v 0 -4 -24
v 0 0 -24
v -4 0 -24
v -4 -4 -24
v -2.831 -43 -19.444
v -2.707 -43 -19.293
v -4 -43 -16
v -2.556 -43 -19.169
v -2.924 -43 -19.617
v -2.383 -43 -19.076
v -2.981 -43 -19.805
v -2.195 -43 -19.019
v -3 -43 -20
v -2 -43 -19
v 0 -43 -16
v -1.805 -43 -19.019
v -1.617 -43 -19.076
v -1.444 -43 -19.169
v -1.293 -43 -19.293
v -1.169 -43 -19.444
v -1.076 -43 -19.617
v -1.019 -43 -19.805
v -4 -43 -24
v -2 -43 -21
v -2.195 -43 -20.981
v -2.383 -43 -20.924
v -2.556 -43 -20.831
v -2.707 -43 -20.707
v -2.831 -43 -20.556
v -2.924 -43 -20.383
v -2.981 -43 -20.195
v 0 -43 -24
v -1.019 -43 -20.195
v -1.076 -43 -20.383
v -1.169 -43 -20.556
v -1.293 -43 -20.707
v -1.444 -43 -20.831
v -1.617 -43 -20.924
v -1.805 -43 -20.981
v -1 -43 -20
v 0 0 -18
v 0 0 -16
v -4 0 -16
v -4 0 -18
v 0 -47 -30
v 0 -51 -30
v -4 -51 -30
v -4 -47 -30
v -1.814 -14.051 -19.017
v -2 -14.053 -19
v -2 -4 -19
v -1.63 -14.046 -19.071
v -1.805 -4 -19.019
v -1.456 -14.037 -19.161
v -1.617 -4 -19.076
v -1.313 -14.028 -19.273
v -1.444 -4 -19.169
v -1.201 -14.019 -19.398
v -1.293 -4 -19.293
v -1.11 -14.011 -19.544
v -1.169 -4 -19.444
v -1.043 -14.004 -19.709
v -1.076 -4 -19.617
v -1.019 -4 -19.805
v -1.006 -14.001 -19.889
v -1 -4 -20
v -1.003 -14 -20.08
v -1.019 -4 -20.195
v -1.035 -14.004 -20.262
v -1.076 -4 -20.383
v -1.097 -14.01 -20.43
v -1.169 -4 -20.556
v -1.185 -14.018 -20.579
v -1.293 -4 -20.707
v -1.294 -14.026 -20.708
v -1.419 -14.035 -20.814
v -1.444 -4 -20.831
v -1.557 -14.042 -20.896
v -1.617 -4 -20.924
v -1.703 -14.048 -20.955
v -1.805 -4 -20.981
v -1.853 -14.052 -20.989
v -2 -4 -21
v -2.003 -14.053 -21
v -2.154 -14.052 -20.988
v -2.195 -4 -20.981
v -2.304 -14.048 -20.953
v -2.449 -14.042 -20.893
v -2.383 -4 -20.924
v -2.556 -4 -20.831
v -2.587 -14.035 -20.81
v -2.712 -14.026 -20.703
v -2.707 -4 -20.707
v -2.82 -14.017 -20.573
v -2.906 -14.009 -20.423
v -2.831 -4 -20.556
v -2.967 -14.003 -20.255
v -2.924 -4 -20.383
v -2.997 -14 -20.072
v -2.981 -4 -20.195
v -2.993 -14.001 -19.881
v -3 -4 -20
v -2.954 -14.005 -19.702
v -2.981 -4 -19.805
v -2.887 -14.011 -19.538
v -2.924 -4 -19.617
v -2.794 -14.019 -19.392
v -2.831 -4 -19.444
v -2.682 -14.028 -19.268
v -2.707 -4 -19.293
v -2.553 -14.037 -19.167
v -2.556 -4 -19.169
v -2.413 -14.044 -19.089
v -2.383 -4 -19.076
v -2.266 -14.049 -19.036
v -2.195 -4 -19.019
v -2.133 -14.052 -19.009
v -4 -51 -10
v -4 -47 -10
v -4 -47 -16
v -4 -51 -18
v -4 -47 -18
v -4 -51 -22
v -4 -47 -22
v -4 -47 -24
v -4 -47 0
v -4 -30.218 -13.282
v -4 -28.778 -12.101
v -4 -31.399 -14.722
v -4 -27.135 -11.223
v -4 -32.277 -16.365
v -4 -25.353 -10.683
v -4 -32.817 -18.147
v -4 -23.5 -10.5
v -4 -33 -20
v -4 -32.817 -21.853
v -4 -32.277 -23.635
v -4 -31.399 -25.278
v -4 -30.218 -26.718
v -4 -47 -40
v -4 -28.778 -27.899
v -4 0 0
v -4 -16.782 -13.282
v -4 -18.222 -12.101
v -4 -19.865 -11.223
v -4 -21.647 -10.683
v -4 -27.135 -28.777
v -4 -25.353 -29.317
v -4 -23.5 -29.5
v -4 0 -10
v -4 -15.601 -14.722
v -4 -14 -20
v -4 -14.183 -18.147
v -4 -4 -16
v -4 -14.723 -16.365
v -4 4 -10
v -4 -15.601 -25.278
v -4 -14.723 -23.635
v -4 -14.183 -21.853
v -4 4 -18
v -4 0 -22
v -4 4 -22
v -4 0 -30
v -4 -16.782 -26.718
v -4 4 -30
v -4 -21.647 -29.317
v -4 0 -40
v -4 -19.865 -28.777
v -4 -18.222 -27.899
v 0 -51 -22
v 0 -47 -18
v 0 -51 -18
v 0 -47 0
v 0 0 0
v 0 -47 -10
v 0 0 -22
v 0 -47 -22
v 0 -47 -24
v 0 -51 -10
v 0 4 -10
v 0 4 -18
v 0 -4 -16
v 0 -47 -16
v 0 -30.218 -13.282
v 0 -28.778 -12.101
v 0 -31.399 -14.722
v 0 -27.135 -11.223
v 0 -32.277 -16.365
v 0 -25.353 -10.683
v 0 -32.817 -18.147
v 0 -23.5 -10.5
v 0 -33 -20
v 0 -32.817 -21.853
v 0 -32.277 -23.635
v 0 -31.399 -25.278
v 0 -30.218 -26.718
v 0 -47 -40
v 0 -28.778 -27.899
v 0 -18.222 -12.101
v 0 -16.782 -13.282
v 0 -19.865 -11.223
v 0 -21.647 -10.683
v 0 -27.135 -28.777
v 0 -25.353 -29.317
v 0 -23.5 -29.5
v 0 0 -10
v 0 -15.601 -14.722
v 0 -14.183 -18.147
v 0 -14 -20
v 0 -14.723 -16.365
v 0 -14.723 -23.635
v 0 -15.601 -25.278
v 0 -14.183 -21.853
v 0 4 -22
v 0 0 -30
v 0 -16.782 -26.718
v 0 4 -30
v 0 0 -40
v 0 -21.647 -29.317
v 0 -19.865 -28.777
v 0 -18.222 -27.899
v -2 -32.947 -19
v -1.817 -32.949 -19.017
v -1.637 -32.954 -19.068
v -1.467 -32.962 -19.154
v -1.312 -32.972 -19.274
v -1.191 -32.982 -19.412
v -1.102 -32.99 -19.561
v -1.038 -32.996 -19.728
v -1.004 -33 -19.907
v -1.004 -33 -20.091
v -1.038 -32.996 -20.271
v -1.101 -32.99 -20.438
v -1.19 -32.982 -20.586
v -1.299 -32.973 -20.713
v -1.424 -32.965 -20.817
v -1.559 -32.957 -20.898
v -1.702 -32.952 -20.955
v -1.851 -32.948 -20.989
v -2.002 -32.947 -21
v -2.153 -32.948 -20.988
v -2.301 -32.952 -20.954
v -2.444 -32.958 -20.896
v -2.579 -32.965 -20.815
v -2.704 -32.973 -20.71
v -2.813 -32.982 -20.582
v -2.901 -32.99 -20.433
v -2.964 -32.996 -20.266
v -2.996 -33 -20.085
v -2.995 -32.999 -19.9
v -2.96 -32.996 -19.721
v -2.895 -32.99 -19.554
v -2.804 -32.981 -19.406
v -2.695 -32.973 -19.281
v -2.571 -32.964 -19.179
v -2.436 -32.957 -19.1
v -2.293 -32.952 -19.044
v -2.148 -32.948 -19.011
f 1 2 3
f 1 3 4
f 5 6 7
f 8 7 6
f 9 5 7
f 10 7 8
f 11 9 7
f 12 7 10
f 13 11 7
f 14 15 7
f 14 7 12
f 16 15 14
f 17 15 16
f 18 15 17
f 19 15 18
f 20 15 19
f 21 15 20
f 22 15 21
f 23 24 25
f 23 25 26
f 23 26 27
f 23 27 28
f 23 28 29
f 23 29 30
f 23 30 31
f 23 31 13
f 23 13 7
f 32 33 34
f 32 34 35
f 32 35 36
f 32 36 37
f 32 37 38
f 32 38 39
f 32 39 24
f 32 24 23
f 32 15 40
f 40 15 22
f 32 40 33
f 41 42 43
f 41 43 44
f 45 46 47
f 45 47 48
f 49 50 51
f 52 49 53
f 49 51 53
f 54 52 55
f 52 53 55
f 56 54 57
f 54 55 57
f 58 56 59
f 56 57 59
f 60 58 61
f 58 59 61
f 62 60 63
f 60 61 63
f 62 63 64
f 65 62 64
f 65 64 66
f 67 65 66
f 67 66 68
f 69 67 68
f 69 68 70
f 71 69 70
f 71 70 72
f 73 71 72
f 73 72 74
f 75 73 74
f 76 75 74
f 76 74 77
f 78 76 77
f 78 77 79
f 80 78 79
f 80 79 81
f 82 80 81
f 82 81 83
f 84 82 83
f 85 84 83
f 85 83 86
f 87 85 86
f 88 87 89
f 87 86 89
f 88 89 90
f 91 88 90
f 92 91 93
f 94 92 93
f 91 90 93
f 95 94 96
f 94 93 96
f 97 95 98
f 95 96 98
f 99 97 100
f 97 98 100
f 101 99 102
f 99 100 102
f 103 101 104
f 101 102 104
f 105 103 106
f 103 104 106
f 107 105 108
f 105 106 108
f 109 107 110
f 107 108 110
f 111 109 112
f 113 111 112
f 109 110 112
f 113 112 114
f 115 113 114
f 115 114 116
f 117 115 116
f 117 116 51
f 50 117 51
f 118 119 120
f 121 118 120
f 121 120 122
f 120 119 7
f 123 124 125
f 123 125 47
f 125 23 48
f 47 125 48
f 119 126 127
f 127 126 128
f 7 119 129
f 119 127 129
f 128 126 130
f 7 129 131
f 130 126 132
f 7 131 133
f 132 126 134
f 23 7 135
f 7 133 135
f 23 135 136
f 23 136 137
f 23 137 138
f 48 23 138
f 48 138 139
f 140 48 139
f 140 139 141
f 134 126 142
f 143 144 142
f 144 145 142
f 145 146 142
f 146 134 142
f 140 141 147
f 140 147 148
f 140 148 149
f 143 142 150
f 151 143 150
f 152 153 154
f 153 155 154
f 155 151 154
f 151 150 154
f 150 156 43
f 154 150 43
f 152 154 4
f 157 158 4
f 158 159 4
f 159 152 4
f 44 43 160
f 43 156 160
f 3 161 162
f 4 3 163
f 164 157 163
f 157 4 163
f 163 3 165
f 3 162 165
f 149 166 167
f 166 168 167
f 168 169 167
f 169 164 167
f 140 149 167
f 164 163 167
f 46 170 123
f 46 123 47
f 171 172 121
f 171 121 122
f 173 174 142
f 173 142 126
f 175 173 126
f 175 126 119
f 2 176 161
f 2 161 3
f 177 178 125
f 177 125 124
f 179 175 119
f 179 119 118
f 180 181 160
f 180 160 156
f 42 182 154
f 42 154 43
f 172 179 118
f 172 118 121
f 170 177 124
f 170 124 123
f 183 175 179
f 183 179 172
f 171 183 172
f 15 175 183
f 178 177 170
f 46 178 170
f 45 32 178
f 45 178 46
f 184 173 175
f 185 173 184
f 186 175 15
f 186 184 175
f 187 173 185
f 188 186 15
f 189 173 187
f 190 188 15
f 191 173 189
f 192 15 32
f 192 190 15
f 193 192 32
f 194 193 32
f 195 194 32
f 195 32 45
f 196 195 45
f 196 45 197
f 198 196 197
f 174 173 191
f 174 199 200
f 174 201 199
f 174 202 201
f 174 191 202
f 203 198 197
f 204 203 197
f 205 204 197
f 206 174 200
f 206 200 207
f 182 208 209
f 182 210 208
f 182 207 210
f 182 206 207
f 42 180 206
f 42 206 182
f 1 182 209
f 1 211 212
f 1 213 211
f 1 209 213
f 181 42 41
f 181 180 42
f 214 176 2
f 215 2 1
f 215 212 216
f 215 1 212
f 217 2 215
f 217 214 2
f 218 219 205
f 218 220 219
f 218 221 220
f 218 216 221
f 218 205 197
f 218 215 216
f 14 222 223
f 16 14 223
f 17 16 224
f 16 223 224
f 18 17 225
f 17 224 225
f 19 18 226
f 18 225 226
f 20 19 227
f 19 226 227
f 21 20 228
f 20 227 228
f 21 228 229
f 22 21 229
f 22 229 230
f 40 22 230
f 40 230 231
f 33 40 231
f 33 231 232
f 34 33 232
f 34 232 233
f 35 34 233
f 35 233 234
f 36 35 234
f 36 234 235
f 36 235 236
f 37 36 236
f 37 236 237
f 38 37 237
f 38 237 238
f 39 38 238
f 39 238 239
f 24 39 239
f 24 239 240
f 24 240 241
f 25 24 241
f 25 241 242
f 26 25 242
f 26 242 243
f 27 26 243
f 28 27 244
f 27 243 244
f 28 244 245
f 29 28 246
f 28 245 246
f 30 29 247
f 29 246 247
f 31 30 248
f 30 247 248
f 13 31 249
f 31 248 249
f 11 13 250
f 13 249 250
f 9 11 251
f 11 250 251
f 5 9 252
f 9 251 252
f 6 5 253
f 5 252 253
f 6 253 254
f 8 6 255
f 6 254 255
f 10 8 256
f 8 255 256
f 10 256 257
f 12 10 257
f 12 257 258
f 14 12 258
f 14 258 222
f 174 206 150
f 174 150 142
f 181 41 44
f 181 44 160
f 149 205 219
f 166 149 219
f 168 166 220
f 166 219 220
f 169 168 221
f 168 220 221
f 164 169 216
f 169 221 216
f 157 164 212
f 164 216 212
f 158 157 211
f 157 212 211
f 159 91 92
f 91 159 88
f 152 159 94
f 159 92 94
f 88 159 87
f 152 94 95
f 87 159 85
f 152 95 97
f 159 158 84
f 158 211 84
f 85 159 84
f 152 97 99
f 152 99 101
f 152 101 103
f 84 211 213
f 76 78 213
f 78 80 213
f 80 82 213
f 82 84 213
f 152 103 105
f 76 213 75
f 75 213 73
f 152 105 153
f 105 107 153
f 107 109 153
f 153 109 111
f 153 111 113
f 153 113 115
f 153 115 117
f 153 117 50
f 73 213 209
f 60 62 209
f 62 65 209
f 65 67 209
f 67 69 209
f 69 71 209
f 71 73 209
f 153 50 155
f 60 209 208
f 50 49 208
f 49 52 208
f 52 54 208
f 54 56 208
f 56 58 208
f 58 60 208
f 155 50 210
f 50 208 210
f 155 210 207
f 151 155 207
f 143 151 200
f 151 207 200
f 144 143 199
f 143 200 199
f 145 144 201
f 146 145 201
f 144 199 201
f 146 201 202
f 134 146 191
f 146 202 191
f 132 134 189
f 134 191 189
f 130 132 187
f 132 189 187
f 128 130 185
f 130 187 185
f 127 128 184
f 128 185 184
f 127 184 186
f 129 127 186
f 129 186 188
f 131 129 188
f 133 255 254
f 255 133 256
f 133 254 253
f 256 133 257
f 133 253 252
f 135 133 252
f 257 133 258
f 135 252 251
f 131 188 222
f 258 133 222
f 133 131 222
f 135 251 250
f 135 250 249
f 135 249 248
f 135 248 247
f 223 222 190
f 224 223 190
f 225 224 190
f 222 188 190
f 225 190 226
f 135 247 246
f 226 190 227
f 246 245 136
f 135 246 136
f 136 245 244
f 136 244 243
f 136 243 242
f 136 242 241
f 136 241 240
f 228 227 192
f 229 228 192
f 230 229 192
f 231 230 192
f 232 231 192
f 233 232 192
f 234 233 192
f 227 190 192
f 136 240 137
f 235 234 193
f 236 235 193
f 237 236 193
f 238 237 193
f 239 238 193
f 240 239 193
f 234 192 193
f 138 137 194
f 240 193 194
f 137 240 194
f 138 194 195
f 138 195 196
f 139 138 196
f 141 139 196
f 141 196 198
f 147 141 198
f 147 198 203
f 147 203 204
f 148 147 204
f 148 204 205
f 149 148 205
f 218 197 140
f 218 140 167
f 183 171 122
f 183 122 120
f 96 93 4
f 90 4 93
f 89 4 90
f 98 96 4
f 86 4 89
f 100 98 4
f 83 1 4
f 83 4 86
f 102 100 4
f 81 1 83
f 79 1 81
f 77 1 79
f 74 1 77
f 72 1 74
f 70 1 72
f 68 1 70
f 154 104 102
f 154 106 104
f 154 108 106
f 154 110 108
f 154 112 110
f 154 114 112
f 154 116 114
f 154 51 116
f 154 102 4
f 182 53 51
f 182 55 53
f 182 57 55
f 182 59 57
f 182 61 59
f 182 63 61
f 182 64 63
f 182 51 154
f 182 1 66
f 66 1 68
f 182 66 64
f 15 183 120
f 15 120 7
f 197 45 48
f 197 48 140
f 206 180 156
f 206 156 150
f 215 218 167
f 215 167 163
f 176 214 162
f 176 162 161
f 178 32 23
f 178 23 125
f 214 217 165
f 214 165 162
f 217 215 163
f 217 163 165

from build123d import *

# Parameters (mm, degrees)
SKETCH_1_R             = 9.5
SM_BASE_FLANGE_1_DEPTH = 4
SKETCH_6_R             = 1
CUT_EXTRUDE_1_DEPTH    = 69.124885321


# Sheet-metal steps are written as plain solids
with BuildPart() as part:
    # Sketch 1 → Базовая кромка1 (new body)
    with BuildSketch(Plane(origin=(0, 0, 0), x_dir=(0, 0, -1), z_dir=(1, 0, 0))):
        Polygon((30, -47), (40, -47), (40, 0), (30, 0), (30, 4), (22, 4), (22, 0), (24, 0), (24, -4), (16, -4), (16, 0), (18, 0), (18, 4), (10, 4), (10, 0), (0, 0), (0, -47), (10, -47), (10, -51), (18, -51), (18, -47), (16, -47), (16, -43), (24, -43), (24, -47), (22, -47), (22, -51), (30, -51), align=None)
        with Locations((20, -23.5)):
            Circle(SKETCH_1_R, mode=Mode.SUBTRACT)
    extrude(amount=-SM_BASE_FLANGE_1_DEPTH)

    # Эскиз6 → Вырез-Вытянуть1 (cut, through all)
    with BuildSketch(Plane(origin=(0, 4, 0), x_dir=(1, 0, 0), z_dir=(0, 1, 0))):
        with Locations(Location((-2, 20, 0), (0, 0, 270))):
            Circle(SKETCH_6_R)
    extrude(amount=-CUT_EXTRUDE_1_DEPTH, mode=Mode.SUBTRACT)


solid = part.part
